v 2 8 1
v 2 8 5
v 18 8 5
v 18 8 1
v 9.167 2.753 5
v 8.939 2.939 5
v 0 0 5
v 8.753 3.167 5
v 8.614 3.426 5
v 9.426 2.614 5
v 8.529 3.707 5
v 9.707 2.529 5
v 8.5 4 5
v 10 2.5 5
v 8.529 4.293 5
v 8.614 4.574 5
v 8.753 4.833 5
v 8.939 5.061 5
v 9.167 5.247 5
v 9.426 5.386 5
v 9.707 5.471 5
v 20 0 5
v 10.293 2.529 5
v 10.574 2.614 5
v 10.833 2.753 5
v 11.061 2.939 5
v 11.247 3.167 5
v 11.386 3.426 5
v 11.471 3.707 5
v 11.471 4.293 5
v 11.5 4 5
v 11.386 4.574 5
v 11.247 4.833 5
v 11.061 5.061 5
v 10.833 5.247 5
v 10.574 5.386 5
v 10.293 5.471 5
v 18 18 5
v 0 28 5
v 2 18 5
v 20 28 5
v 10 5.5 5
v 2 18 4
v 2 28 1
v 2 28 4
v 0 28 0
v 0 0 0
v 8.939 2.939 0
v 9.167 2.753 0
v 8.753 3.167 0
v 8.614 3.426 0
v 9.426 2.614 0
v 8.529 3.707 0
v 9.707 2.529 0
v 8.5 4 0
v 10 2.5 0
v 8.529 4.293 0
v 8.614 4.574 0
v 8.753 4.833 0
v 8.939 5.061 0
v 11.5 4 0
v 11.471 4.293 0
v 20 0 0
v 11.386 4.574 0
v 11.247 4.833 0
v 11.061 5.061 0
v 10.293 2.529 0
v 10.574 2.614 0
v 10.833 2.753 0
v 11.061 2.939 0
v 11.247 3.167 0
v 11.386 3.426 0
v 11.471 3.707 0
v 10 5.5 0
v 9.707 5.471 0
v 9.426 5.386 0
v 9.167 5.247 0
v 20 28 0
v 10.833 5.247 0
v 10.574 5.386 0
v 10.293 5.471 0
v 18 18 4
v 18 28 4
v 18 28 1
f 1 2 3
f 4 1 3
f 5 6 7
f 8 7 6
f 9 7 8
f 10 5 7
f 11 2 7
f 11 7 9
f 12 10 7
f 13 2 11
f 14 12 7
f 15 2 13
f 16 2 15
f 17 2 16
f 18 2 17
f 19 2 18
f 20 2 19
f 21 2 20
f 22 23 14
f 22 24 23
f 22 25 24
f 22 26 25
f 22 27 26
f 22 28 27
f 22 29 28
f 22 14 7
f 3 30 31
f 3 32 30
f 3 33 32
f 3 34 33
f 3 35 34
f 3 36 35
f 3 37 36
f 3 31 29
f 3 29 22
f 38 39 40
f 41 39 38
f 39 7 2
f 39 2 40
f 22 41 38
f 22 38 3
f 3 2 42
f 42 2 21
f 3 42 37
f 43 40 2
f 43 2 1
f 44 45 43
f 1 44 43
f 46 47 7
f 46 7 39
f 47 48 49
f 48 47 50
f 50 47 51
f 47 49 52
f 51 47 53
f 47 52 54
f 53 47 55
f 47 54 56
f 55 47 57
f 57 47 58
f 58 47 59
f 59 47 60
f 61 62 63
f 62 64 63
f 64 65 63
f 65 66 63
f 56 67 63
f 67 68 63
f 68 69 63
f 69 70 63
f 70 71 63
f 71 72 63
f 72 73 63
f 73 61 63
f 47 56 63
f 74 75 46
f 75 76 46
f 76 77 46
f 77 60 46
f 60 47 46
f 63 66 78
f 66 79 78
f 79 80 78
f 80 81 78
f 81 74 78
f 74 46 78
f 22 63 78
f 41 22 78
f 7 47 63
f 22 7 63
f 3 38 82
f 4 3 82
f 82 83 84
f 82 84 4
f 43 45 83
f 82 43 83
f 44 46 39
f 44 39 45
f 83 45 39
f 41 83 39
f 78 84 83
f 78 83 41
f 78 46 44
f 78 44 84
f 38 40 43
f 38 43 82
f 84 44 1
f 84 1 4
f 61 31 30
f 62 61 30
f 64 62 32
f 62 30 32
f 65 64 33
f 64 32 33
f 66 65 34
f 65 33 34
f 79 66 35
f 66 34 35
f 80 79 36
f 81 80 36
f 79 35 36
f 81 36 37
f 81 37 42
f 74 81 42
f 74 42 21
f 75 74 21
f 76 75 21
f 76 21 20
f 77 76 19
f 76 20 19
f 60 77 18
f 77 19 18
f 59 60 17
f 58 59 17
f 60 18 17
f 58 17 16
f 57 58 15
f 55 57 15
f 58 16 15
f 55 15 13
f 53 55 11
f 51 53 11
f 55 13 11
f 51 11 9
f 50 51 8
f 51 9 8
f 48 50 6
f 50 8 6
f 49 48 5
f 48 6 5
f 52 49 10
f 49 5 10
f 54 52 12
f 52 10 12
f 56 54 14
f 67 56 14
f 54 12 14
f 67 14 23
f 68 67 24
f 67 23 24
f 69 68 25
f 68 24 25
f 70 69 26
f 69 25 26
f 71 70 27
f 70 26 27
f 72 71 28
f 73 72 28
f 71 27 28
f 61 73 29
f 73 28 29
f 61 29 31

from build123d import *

# Parameters (mm, degrees)
SKETCH1_W           = 20
SKETCH1_H           = 28
BOSS_EXTRUDE1_DEPTH = 5
SKETCH2_R           = 1.5
CUT_EXTRUDE1_DEPTH  = 5
SKETCH3_W           = 16
SKETCH3_H           = 3
CUT_EXTRUDE2_DEPTH  = 20
SKETCH4_W           = 16
SKETCH4_H           = 10
CUT_EXTRUDE3_DEPTH  = 4


with BuildPart() as part:
    # Sketch1 → Boss-Extrude1 (new body)
    with BuildSketch(Plane.XY):
        with Locations((10, 14)):
            Rectangle(SKETCH1_W, SKETCH1_H)
    extrude(amount=BOSS_EXTRUDE1_DEPTH)

    # Sketch2 → Cut-Extrude1 (cut)
    with BuildSketch(Plane.XY.offset(5)):
        with Locations((10, 4)):
            Circle(SKETCH2_R)
    extrude(amount=-CUT_EXTRUDE1_DEPTH, mode=Mode.SUBTRACT)

    # Sketch3 → Cut-Extrude2 (cut)
    with BuildSketch(Plane(origin=(0, 28, 0), x_dir=(1, 0, 0), z_dir=(0, 1, 0))):
        with Locations((10, -2.5)):
            Rectangle(SKETCH3_W, SKETCH3_H)
    extrude(amount=-CUT_EXTRUDE2_DEPTH, mode=Mode.SUBTRACT)

    # Sketch4 → Cut-Extrude3 (cut)
    with BuildSketch(Plane.XY.offset(5)):
        with Locations((10, 13)):
            Rectangle(SKETCH4_W, SKETCH4_H)
    extrude(amount=-CUT_EXTRUDE3_DEPTH, mode=Mode.SUBTRACT)


solid = part.part
